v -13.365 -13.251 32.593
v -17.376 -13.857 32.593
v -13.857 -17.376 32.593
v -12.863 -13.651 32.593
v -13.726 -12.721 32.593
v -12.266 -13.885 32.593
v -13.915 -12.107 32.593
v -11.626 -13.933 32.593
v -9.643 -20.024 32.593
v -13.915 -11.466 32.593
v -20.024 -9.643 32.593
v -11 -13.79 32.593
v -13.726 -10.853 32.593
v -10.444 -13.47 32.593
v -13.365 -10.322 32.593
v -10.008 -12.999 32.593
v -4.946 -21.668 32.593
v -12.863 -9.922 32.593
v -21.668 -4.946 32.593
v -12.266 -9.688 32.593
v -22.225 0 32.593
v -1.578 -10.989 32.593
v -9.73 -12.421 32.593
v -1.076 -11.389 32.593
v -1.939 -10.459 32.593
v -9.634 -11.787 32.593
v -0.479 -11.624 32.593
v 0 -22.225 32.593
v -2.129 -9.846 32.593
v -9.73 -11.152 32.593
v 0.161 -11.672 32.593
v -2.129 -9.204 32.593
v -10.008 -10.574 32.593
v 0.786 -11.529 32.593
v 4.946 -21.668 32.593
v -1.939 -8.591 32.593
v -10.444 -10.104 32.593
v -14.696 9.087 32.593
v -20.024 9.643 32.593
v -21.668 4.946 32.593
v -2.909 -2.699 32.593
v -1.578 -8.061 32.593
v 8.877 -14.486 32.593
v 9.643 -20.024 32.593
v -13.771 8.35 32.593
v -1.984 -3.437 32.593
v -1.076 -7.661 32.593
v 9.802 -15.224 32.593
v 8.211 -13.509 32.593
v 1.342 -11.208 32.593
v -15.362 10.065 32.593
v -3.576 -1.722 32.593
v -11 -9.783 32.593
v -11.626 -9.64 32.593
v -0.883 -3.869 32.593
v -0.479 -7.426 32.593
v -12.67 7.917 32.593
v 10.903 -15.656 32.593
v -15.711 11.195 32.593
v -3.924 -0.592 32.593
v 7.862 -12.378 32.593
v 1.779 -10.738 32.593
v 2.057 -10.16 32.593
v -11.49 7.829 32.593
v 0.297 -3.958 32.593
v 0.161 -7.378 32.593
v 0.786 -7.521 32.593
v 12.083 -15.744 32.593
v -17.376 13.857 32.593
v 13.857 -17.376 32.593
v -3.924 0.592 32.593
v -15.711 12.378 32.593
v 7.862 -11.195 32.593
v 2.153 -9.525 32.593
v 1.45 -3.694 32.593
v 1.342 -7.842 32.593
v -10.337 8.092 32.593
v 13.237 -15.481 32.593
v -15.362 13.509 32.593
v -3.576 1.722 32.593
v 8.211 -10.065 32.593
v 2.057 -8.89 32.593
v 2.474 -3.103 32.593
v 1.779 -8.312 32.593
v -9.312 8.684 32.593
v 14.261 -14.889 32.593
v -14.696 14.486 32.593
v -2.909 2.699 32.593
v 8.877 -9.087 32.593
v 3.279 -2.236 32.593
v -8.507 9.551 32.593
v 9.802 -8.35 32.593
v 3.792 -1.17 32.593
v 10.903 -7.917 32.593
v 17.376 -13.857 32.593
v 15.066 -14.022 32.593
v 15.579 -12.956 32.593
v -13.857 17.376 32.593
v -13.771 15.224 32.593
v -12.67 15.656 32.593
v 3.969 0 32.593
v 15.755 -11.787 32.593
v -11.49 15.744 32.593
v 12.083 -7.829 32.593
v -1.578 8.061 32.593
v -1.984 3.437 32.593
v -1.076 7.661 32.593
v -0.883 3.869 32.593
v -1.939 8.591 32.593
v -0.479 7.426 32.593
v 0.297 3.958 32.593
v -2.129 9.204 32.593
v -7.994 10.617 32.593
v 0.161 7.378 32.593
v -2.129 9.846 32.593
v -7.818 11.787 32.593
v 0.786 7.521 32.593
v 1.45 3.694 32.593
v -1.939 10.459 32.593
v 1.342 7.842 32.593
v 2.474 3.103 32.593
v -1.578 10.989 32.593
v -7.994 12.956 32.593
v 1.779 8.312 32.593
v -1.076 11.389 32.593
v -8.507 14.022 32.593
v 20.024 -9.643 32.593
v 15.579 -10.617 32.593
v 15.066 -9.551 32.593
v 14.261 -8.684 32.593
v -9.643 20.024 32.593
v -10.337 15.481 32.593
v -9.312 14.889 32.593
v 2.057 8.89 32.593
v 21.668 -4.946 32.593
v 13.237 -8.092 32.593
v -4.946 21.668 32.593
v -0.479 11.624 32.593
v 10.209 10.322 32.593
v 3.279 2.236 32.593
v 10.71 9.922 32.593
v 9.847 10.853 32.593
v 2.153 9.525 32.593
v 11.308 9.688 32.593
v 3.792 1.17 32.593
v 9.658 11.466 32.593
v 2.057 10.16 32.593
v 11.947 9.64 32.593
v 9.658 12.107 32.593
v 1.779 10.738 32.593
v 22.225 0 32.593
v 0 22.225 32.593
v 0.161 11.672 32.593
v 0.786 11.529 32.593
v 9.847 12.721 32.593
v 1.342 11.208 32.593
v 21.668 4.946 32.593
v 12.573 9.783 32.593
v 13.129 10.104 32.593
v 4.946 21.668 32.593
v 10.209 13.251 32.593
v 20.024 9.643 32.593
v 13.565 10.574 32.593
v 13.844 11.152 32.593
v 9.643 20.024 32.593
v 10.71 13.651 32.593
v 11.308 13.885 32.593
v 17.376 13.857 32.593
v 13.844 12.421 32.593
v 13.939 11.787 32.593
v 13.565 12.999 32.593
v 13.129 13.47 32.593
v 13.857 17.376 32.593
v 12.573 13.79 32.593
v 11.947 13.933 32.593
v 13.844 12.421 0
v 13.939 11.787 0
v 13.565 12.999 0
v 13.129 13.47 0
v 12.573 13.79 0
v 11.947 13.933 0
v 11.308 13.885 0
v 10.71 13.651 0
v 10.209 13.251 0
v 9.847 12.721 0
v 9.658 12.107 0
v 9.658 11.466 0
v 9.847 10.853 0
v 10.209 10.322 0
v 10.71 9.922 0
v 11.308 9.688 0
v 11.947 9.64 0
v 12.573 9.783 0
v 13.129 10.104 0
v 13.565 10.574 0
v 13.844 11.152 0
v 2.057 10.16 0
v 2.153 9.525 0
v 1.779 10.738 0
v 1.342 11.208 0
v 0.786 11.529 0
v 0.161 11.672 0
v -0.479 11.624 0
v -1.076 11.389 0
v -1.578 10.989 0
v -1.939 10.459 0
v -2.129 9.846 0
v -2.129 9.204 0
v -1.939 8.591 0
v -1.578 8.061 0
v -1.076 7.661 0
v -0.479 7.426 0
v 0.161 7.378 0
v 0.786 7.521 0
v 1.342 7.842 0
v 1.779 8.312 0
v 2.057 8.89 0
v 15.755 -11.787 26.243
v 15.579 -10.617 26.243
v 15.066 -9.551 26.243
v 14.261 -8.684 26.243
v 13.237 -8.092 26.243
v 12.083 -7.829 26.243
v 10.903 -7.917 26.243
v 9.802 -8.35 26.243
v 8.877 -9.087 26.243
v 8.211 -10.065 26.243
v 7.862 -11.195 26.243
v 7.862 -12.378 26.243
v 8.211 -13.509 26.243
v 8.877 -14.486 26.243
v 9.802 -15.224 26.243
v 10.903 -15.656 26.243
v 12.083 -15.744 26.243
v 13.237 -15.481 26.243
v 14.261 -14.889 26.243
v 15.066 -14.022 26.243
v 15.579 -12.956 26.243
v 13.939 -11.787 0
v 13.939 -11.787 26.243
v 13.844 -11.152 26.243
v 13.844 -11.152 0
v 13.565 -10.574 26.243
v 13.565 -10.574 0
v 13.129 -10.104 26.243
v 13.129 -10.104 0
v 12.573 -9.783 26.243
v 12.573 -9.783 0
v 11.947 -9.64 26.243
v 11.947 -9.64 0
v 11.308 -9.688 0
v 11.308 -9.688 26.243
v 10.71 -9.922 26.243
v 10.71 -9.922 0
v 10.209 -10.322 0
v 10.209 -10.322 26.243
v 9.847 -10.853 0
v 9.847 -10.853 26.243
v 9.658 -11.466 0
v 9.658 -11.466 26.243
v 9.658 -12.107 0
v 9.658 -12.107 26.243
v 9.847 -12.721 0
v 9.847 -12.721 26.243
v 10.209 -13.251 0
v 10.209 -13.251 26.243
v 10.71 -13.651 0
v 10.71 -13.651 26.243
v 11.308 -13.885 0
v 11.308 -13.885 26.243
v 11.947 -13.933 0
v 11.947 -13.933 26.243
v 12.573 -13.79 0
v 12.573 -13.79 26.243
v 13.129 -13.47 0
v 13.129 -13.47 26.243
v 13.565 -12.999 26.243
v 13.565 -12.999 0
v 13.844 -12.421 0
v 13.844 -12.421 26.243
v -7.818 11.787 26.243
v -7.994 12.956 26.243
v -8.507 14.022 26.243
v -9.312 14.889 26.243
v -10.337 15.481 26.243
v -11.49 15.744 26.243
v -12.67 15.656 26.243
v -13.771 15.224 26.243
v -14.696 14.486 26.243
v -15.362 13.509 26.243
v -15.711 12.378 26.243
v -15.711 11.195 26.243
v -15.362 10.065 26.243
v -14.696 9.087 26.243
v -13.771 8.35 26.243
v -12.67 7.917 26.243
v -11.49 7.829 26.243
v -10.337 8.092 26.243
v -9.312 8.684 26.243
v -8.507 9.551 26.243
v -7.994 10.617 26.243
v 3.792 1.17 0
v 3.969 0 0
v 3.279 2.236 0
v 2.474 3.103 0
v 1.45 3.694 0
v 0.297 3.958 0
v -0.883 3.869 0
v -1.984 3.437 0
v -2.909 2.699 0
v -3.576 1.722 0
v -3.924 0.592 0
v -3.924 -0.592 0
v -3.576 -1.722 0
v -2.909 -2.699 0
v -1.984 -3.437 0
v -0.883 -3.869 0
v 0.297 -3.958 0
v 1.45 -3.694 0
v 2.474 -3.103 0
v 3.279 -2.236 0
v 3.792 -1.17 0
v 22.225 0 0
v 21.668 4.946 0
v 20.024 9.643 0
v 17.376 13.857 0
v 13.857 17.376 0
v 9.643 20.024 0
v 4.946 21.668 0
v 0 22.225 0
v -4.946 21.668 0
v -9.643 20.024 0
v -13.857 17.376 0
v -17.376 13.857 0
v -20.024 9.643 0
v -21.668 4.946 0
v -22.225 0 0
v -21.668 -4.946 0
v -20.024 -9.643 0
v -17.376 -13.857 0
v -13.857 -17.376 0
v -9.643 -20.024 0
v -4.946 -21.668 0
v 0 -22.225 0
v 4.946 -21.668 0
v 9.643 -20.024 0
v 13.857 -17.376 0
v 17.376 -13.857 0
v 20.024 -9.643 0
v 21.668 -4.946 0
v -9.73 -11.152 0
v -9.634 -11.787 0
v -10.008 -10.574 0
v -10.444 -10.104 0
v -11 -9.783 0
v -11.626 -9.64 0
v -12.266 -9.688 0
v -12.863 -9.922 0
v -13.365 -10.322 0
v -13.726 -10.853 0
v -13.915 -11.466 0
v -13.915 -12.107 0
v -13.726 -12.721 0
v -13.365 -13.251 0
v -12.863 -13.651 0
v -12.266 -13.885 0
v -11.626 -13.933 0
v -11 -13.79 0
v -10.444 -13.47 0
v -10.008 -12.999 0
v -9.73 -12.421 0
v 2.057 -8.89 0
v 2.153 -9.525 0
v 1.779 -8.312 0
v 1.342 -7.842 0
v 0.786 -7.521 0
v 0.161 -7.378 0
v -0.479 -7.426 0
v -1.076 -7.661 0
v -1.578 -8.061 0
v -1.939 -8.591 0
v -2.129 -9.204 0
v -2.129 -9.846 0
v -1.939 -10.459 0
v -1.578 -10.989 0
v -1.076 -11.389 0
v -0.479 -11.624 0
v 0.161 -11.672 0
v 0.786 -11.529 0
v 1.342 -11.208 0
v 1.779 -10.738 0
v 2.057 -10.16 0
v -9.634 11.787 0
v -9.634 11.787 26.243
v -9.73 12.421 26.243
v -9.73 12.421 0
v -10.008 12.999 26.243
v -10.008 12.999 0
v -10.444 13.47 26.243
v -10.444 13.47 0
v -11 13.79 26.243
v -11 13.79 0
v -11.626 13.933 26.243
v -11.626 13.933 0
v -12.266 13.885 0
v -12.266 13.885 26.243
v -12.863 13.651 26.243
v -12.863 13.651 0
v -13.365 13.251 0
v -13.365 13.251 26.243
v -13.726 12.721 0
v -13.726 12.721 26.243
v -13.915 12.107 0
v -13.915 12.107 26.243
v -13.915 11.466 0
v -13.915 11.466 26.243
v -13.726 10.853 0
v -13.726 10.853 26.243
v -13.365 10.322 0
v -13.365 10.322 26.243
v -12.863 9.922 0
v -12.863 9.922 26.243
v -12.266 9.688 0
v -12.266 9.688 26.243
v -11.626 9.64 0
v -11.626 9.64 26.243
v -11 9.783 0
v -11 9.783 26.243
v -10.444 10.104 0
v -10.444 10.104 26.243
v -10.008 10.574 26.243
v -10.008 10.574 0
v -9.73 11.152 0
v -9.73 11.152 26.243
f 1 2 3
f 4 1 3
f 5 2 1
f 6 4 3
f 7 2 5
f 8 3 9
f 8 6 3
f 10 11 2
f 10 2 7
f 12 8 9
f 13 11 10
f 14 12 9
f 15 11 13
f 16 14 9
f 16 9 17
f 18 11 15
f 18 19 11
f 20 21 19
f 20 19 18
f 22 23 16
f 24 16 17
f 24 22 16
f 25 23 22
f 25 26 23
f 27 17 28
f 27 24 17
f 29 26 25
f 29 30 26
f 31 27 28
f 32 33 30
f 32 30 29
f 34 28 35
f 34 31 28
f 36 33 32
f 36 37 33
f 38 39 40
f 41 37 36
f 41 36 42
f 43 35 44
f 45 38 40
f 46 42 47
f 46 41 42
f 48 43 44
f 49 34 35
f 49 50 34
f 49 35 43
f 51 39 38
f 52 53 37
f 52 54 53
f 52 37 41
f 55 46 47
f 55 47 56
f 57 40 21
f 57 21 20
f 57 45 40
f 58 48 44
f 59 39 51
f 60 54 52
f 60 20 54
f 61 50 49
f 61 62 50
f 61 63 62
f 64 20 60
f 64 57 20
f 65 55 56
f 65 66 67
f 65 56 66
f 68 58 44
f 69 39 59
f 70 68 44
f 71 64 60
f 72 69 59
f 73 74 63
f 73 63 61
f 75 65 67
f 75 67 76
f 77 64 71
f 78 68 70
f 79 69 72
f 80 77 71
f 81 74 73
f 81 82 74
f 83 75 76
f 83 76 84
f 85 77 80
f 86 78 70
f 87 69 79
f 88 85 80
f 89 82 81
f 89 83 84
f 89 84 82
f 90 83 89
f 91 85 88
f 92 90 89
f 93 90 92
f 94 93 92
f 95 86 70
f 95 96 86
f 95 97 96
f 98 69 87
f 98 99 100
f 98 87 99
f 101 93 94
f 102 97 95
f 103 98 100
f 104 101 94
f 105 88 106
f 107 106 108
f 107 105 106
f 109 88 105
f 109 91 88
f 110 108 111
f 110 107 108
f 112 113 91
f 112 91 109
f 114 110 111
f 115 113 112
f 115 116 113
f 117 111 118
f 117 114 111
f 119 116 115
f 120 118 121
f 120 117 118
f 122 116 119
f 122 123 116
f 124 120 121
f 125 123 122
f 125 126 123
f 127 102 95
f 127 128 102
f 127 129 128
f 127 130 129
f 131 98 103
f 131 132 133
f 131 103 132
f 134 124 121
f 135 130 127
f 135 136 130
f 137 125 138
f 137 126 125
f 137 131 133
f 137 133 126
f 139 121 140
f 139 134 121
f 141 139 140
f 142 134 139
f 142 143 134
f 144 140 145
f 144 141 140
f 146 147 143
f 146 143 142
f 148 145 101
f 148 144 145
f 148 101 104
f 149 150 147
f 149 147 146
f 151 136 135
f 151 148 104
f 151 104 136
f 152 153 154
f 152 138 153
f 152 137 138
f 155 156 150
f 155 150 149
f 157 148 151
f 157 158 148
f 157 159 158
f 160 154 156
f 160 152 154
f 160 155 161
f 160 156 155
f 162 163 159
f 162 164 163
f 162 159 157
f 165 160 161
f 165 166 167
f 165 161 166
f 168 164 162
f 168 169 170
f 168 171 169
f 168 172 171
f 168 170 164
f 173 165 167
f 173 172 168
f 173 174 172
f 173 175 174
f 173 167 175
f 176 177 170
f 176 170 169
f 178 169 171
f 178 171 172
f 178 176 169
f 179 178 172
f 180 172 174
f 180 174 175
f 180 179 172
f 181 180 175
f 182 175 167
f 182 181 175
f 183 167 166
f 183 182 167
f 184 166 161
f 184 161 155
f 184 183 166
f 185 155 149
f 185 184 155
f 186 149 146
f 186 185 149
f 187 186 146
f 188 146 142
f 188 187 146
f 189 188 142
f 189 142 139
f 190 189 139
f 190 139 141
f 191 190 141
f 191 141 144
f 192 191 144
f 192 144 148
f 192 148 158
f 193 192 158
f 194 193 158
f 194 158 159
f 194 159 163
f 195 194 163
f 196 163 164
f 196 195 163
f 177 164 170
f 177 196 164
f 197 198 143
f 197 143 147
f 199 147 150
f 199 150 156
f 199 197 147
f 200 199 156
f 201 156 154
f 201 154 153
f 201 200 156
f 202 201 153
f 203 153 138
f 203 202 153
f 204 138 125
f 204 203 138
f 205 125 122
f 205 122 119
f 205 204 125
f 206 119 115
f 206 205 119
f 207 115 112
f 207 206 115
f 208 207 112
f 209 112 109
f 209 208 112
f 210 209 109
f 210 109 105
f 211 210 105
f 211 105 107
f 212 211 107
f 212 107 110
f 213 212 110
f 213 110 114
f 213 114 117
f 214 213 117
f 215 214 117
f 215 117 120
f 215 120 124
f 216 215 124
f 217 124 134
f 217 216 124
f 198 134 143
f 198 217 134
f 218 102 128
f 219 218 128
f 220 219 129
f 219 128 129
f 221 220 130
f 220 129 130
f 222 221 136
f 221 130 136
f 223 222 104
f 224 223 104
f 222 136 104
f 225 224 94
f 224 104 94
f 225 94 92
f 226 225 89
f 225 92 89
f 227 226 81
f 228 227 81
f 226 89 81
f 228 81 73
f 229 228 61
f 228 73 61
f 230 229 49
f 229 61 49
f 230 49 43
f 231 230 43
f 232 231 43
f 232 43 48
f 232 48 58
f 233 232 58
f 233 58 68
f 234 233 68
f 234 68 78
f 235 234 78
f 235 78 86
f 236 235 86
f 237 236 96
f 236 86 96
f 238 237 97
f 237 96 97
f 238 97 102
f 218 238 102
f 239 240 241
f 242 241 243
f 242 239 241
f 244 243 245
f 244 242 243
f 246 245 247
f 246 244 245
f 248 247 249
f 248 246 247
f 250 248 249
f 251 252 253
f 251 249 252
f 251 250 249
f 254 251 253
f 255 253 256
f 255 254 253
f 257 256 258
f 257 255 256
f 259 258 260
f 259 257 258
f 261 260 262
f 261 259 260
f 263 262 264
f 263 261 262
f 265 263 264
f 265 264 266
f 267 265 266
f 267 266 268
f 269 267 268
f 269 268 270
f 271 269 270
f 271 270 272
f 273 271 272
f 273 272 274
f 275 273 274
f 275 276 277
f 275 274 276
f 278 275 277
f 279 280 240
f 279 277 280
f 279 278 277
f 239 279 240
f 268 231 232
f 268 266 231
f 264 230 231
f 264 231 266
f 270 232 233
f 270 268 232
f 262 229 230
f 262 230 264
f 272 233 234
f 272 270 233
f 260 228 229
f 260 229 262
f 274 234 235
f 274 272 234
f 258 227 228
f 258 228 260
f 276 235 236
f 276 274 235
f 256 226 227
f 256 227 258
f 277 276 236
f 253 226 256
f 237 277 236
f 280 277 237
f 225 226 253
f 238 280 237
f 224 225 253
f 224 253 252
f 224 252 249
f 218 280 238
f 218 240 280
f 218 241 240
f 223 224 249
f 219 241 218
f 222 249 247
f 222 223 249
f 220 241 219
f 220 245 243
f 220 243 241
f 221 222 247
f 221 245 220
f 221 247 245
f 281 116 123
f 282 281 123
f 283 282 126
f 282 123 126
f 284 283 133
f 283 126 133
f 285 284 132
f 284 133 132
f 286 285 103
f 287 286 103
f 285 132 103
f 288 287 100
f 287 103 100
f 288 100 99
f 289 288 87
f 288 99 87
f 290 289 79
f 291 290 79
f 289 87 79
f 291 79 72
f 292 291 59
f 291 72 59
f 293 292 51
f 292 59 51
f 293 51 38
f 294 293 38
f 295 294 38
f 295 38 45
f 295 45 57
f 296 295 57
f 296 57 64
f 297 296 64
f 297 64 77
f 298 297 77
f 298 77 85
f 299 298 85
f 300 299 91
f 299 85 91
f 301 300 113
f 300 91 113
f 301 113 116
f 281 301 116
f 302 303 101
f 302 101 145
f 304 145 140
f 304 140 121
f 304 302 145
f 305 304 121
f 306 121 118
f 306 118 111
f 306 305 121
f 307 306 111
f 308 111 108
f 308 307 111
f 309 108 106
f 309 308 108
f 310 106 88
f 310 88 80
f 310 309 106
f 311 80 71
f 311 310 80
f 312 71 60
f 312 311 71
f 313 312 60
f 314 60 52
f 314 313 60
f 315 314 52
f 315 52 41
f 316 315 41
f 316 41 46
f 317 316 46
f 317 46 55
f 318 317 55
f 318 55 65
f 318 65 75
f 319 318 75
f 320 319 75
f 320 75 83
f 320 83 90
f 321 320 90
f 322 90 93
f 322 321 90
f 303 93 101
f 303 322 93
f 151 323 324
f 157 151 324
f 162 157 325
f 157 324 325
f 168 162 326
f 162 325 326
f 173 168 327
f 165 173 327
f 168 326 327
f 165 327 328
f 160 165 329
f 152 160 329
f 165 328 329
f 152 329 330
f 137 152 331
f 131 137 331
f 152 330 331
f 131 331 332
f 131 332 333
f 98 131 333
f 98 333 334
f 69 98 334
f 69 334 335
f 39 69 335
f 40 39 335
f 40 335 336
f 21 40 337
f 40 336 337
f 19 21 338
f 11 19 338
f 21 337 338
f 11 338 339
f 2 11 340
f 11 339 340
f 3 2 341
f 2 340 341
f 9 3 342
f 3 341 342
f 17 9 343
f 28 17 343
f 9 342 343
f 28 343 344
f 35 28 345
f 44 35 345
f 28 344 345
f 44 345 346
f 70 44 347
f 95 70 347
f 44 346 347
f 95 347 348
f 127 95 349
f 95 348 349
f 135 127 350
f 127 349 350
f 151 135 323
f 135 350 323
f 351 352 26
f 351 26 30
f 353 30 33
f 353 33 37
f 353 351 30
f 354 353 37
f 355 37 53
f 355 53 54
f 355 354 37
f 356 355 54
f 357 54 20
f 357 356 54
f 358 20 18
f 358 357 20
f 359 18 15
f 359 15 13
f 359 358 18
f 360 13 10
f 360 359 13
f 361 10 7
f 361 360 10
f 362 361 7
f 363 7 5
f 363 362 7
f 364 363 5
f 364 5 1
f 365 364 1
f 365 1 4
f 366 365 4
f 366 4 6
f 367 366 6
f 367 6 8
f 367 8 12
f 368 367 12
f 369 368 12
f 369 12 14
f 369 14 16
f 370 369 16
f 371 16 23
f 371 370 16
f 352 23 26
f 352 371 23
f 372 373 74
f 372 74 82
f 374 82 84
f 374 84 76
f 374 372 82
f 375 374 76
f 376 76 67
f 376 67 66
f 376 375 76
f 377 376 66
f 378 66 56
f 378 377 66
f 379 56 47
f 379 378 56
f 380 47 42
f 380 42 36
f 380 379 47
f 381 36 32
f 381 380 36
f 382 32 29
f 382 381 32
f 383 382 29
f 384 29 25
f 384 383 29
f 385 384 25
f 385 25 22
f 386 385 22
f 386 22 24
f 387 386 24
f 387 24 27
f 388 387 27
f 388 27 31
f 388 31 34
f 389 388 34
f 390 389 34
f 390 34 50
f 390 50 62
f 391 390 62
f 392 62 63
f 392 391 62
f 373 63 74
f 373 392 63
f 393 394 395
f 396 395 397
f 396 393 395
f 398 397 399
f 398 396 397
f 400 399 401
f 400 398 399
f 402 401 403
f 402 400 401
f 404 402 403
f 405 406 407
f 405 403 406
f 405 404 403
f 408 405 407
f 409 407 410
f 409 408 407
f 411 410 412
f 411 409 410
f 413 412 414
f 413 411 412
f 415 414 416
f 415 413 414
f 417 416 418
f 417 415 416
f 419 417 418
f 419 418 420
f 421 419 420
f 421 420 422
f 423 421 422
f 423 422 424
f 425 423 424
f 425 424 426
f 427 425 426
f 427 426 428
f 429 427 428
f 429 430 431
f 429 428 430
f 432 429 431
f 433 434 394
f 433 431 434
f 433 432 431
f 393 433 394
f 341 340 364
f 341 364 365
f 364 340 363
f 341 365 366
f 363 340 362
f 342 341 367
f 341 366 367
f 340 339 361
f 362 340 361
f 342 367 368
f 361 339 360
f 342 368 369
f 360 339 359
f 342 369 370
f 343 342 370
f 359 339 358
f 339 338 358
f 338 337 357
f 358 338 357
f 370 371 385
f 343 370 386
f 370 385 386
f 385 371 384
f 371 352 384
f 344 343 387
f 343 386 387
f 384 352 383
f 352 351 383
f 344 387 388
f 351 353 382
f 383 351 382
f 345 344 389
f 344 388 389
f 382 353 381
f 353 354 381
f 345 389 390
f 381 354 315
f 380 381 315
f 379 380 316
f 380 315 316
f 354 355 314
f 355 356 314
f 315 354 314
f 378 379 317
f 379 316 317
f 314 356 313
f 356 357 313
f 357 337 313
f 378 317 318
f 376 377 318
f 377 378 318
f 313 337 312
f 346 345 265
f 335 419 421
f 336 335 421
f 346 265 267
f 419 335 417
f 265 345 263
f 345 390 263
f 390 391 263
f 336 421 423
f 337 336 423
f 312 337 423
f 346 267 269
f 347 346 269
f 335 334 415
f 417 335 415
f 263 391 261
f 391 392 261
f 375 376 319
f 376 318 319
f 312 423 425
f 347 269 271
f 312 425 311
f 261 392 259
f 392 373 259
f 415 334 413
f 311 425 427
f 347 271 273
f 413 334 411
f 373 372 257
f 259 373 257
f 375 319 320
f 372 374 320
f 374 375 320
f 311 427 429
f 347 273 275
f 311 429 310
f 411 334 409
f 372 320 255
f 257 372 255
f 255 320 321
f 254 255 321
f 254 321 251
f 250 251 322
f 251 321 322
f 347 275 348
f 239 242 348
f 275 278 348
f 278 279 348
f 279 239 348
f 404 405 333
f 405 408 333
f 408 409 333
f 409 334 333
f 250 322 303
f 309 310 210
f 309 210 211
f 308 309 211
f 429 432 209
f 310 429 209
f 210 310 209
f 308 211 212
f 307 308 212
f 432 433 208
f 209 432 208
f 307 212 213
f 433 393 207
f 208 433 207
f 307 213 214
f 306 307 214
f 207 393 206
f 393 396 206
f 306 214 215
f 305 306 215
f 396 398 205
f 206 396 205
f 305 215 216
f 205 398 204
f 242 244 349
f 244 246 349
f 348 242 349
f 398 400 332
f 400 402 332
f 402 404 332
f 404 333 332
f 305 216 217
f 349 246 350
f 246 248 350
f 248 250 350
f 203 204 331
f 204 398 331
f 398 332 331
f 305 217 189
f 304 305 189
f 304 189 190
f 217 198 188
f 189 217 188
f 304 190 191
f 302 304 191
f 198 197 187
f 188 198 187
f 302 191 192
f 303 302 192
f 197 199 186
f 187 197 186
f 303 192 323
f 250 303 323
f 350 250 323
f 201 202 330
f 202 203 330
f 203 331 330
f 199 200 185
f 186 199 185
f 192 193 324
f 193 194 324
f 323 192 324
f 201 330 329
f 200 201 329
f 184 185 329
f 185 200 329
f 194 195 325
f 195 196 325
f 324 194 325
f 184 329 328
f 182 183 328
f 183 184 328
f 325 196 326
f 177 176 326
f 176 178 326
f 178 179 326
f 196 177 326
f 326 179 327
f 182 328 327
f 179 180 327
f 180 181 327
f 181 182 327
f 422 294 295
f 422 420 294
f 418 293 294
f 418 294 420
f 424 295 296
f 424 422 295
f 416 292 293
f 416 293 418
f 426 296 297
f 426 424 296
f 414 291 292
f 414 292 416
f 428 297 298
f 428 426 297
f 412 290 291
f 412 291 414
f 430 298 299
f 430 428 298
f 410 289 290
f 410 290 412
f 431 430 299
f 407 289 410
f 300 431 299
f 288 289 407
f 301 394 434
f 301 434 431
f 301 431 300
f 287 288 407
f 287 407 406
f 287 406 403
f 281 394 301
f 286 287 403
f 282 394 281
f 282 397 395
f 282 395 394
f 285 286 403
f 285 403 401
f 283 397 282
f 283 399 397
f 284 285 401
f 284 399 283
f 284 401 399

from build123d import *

# Parameters (mm, degrees)
F0_R     = 22.225
F0_R_2   = 2.15265
F0_R_3   = 3.96875
F1_DEPTH = 32.593001
F2_R     = 3.96875
F3_DEPTH = 6.35


with BuildPart() as f1:
    # F0 (on Top) → F1 (new body)
    with BuildSketch(Plane.XY):
        Circle(F0_R)
        with Locations((-11.786586, -11.786586)):
            Circle(F0_R_2, mode=Mode.SUBTRACT)
        with Locations((11.786586, -11.786586)):
            Circle(F0_R_2, mode=Mode.SUBTRACT)
        with Locations((0, -9.525)):
            Circle(F0_R_2, mode=Mode.SUBTRACT)
        with Locations((-11.786586, 11.786586)):
            Circle(F0_R_2, mode=Mode.SUBTRACT)
        Circle(F0_R_3, mode=Mode.SUBTRACT)
        with Locations((0, 9.525)):
            Circle(F0_R_2, mode=Mode.SUBTRACT)
        with Locations((11.786586, 11.786586)):
            Circle(F0_R_2, mode=Mode.SUBTRACT)
    extrude(amount=F1_DEPTH)

    # F2 (on face) → F3 (cut)
    with BuildSketch(Plane.XY.offset(32.593001)):
        with Locations((-11.786586, 11.786586)):
            Circle(F2_R)
        with Locations((11.786586, -11.786586)):
            Circle(F2_R)
    extrude(amount=-F3_DEPTH, mode=Mode.SUBTRACT)


solid = f1.part
